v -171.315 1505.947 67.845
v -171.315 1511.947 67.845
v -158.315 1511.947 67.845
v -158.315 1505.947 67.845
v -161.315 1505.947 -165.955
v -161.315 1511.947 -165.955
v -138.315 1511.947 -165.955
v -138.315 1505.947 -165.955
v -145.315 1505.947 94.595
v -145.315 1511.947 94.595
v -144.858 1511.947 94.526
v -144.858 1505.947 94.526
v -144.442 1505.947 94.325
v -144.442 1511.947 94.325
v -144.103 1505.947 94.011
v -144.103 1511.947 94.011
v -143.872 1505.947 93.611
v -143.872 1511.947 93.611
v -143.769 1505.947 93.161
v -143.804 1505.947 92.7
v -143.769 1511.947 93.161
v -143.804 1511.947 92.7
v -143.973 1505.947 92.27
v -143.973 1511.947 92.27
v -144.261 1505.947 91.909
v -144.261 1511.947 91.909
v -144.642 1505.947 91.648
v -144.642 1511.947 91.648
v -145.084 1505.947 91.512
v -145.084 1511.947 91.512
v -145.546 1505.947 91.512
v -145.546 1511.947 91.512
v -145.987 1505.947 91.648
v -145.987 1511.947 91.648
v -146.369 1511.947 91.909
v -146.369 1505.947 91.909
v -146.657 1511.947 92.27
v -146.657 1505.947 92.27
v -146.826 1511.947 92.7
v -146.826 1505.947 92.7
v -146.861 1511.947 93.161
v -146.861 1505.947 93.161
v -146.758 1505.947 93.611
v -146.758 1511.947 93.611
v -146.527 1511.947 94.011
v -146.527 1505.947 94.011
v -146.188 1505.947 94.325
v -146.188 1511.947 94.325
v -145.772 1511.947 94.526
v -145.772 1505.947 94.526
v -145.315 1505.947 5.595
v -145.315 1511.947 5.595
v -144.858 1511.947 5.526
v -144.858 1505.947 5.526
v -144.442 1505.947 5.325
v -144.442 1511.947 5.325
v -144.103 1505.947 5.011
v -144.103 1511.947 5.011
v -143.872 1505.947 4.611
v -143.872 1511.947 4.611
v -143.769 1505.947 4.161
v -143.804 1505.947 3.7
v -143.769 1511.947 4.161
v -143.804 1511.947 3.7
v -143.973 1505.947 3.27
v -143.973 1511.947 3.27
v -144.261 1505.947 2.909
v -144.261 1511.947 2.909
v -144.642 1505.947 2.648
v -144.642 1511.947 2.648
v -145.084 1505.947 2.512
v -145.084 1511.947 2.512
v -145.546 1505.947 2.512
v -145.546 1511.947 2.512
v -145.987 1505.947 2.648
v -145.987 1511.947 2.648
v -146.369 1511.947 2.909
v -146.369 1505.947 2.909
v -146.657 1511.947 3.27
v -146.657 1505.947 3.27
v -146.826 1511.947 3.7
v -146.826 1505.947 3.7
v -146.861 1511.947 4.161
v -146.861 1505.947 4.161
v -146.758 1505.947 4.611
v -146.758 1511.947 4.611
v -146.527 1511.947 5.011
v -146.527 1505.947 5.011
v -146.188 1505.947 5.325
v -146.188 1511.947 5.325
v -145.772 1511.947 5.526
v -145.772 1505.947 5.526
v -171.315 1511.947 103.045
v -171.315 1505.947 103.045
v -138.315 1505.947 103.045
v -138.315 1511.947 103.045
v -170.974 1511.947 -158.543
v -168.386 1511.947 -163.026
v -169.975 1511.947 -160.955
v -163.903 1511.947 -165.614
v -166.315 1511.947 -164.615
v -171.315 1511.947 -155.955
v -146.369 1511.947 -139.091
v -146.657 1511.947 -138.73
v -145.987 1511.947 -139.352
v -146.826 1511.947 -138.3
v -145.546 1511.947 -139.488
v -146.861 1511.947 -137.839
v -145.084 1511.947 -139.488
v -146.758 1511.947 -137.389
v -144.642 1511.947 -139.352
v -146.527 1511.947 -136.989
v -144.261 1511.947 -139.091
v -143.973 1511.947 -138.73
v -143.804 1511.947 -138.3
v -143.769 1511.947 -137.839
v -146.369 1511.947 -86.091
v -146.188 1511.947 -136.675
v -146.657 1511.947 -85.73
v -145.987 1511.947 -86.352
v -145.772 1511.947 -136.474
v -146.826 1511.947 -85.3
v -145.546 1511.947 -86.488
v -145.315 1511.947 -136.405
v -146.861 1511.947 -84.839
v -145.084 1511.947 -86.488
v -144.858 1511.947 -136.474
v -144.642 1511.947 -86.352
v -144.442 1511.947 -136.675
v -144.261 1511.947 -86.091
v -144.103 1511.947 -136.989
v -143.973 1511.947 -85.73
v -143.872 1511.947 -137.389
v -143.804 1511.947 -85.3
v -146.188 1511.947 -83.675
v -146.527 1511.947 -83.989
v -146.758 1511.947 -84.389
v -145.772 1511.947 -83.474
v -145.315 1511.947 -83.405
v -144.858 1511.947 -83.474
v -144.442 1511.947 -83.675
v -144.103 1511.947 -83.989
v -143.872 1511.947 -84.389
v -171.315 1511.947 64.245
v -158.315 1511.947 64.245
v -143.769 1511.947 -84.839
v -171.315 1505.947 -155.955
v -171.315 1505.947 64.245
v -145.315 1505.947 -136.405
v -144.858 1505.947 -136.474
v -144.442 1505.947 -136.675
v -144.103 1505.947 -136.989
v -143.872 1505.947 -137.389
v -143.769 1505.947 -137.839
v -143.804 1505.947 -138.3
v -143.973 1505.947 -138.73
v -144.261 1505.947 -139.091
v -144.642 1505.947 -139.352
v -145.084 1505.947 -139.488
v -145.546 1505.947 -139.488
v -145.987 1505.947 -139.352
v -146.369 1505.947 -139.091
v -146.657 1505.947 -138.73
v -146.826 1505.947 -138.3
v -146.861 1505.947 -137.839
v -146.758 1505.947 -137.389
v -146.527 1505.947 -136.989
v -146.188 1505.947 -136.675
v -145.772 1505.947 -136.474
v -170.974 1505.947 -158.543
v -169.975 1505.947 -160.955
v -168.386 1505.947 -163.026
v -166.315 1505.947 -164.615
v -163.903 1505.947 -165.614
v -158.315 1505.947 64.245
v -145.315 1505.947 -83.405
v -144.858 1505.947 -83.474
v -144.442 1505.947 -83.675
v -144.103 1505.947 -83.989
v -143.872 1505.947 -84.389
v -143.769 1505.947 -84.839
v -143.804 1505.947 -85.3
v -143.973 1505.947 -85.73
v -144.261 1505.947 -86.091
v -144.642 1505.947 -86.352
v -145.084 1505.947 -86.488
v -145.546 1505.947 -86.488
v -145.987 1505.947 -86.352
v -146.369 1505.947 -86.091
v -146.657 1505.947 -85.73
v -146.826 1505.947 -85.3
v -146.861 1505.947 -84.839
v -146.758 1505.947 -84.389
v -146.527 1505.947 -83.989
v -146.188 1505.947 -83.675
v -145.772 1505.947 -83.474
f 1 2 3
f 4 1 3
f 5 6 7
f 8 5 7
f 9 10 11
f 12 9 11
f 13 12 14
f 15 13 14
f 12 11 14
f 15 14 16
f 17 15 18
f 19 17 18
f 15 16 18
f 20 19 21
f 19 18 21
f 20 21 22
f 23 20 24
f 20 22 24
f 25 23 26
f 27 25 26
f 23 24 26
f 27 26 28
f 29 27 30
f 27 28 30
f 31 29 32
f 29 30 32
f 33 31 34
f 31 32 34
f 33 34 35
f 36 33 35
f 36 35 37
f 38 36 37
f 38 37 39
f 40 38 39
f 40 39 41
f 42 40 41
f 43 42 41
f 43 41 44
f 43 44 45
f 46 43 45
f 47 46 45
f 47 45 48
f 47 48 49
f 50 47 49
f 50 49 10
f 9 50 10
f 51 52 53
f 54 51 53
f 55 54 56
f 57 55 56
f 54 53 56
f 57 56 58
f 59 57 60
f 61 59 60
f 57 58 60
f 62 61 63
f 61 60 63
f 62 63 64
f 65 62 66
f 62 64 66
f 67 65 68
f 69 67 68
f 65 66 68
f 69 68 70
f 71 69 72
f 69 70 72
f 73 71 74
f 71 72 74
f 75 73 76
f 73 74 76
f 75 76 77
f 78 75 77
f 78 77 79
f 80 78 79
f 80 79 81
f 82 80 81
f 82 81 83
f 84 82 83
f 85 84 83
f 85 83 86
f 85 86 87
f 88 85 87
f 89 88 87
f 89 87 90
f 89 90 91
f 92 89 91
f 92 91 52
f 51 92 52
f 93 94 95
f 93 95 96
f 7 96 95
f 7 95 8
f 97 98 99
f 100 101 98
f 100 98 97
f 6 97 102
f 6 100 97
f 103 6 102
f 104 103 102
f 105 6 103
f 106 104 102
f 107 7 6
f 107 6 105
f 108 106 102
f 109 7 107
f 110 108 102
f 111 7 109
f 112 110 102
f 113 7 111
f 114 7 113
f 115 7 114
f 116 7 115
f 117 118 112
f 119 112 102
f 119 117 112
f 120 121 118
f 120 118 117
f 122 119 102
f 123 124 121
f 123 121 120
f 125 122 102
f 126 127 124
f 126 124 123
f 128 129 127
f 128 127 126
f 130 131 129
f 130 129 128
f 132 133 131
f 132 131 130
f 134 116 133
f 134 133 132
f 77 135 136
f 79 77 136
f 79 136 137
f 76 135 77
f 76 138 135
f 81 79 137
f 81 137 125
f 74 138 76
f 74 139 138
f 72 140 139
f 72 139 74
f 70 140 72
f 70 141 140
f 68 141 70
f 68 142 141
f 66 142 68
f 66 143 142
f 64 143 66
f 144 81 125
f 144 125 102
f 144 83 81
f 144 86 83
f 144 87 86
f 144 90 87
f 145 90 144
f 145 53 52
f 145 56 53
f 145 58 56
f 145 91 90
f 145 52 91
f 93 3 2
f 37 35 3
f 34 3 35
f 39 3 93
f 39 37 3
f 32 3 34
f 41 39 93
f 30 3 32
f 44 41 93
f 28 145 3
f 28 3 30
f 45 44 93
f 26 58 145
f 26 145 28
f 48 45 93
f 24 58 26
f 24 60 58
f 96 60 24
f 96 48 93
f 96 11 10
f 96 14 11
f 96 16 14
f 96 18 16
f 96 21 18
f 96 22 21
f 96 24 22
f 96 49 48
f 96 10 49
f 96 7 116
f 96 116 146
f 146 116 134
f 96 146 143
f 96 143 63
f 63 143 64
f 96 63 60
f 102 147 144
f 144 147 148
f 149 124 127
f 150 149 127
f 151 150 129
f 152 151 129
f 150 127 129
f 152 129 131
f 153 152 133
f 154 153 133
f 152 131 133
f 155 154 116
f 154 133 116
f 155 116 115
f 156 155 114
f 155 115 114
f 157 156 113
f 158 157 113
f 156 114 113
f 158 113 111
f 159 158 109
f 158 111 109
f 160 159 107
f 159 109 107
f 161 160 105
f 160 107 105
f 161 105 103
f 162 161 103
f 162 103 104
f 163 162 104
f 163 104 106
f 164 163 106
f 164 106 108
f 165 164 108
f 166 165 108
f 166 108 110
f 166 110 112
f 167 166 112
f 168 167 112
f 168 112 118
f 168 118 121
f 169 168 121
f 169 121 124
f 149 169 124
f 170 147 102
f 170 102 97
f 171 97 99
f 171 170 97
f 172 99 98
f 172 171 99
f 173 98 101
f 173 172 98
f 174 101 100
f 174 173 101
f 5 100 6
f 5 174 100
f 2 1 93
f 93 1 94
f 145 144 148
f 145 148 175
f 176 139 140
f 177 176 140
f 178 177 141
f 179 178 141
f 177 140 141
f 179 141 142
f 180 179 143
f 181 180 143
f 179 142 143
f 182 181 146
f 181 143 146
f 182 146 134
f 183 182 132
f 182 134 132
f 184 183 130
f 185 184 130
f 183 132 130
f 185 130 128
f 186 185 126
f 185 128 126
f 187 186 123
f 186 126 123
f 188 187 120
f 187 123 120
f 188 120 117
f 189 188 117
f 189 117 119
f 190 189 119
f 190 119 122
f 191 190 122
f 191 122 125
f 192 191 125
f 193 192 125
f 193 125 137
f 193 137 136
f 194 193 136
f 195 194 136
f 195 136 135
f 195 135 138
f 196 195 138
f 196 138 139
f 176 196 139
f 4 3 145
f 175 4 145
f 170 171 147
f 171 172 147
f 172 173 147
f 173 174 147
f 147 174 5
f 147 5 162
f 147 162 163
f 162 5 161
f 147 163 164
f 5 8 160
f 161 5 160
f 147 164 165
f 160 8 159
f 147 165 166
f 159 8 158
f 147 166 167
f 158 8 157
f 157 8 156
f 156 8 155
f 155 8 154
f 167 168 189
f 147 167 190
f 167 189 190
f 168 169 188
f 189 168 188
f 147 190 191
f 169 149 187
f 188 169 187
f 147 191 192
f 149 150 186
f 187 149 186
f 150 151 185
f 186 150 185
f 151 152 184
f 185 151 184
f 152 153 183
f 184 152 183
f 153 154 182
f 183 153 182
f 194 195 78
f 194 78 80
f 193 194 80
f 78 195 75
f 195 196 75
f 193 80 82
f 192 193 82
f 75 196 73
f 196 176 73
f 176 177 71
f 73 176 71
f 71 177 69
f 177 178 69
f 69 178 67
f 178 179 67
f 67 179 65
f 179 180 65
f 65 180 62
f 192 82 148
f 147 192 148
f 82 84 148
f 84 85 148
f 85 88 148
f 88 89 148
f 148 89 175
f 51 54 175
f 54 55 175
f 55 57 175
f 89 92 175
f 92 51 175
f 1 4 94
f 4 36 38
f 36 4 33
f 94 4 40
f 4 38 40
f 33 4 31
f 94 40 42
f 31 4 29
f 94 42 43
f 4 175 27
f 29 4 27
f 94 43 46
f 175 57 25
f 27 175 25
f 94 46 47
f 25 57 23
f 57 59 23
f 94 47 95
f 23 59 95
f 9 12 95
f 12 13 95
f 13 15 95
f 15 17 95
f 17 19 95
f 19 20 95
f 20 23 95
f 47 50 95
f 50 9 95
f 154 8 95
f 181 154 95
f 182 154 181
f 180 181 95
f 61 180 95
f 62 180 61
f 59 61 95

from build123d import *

# Parameters (mm, degrees)
SZKIC2_W                    = 287
SZKIC2_H                    = 852
DODANIE_WYCI_GNI_CIE1_DEPTH = 6
WYTNIJ_WYCI_GNI_CIE1_DEPTH  = 10
SZKIC5_OUTSIDE_W            = 1033.812
SZKIC5_OUTSIDE_H            = 468.812
SZKIC5_OUTSIDE_W_2          = 20
SZKIC5_OUTSIDE_H_2          = 287
WYTNIJ_WYCI_GNI_CIE3_DEPTH  = 718.686874591
PRZENIE_CIAN_1_BY           = 13
SZKIC6_W                    = 33
SZKIC6_H                    = 18
WYTNIJ_WYCI_GNI_CIE4_DEPTH  = 10
WYTNIJ_WYCI_GNI_CIE6_DEPTH  = 239.591606015
SZKIC9_R                    = 1.55
WYTNIJ_WYCI_GNI_CIE7_DEPTH  = 10
SZKIC11_W                   = 13
SZKIC11_H                   = 3.6
WYTNIJ_WYCI_GNI_CIE8_DEPTH  = 10


with BuildPart() as part:
    # Szkic2 → Dodanie-wyciągnięcie1 (new body)
    with BuildSketch(Plane.ZX.offset(1505.947389818)):
        with Locations((-40.455224703, 267.685033185)):
            Rectangle(SZKIC2_W, SZKIC2_H)
    extrude(amount=DODANIE_WYCI_GNI_CIE1_DEPTH)

    # Szkic3 → Wytnij-wyciągnięcie1 (cut)
    with BuildSketch(Plane(origin=(0, 1511.947389818, 0), x_dir=(1, 0, 0), z_dir=(0, 1, 0))):
        with BuildLine():
            Line((673.685033185, -73.044775297), (673.685033185, 153.955224703))
            ThreePointArc((673.685033185, 153.955224703), (670.756100997, 161.026292515), (663.685033185, 163.955224703))
            Line((663.685033185, 163.955224703), (-128.314966815, 163.955224703))
            ThreePointArc((-128.314966815, 163.955224703), (-135.386034627, 161.026292515), (-138.314966815, 153.955224703))
            Line((-138.314966815, 153.955224703), (-138.314966815, -73.044775297))
            ThreePointArc((-138.314966815, -73.044775297), (-135.386034627, -80.115843109), (-128.314966815, -83.044775297))
            Line((-128.314966815, -83.044775297), (663.685033185, -83.044775297))
            ThreePointArc((663.685033185, -83.044775297), (670.756100997, -80.115843109), (673.685033185, -73.044775297))
        make_face()
    extrude(amount=-WYTNIJ_WYCI_GNI_CIE1_DEPTH, mode=Mode.SUBTRACT)

    # Szkic5 outside → Wytnij-wyciągnięcie3 (cut, through all)
    with BuildSketch(Plane(origin=(0, 1511.947389818, 0), x_dir=(1, 0, 0), z_dir=(0, 1, 0))):
        with Locations((267.685, 40.455)):
            Rectangle(SZKIC5_OUTSIDE_W, SZKIC5_OUTSIDE_H)
        with Locations((-148.314966815, 40.455224703)):
            Rectangle(SZKIC5_OUTSIDE_W_2, SZKIC5_OUTSIDE_H_2, mode=Mode.SUBTRACT)
    extrude(amount=-WYTNIJ_WYCI_GNI_CIE3_DEPTH, mode=Mode.SUBTRACT)

    # Przenieś ścianę1: a face moved outward by 13.0
    extrude(part.faces().sort_by_distance((-158.314966815, 1508.947389818, -40.455224703))[0], amount=PRZENIE_CIAN_1_BY, dir=(-1, 0, 0))

    # Szkic6 → Wytnij-wyciągnięcie4 (cut)
    with BuildSketch(Plane(origin=(0, 1511.947389818, 0), x_dir=(1, 0, 0), z_dir=(0, 1, 0))):
        with Locations((-154.814966815, 174.955224703)):
            Rectangle(SZKIC6_W, SZKIC6_H)
    extrude(amount=-WYTNIJ_WYCI_GNI_CIE4_DEPTH, mode=Mode.SUBTRACT)

    # Szkic8 → Wytnij-wyciągnięcie6 (cut, through all)
    with BuildSketch(Plane.XZ.offset(-1505.947389818)):
        with BuildLine():
            Line((-161.314966815, -165.955224703), (-171.314966815, -165.955224703))
            Line((-171.314966815, -165.955224703), (-171.314966815, -155.955224703))
            ThreePointArc((-171.314966815, -155.955224703), (-168.386034627, -163.026292515), (-161.314966815, -165.955224703))
        make_face()
    extrude(amount=-WYTNIJ_WYCI_GNI_CIE6_DEPTH, mode=Mode.SUBTRACT)

    # Szkic9 → Wytnij-wyciągnięcie7 (cut)
    with BuildSketch(Plane(origin=(0, 1511.947389818, 0), x_dir=(1, 0, 0), z_dir=(0, 1, 0))):
        with Locations(Location((-145.314966815, -93.044775297, 0), (0, 0, 270))):
            Circle(SZKIC9_R)
        with Locations(Location((-145.314966815, -4.044775297, 0), (0, 0, 270))):
            Circle(SZKIC9_R)
        with Locations(Location((-145.314966815, 84.955224703, 0), (0, 0, 270))):
            Circle(SZKIC9_R)
        with Locations(Location((-145.314966815, 137.955224703, 0), (0, 0, 270))):
            Circle(SZKIC9_R)
        with Locations((-145.314966815, 173.955224703)):
            Circle(SZKIC9_R)
    extrude(amount=-WYTNIJ_WYCI_GNI_CIE7_DEPTH, mode=Mode.SUBTRACT)

    # Szkic11 → Wytnij-wyciągnięcie8 (cut)
    with BuildSketch(Plane(origin=(0, 1511.947389818, 0), x_dir=(1, 0, 0), z_dir=(0, 1, 0))):
        with Locations((-164.814966815, -66.044775297)):
            Rectangle(SZKIC11_W, SZKIC11_H)
    extrude(amount=-WYTNIJ_WYCI_GNI_CIE8_DEPTH, mode=Mode.SUBTRACT)


solid = part.part
